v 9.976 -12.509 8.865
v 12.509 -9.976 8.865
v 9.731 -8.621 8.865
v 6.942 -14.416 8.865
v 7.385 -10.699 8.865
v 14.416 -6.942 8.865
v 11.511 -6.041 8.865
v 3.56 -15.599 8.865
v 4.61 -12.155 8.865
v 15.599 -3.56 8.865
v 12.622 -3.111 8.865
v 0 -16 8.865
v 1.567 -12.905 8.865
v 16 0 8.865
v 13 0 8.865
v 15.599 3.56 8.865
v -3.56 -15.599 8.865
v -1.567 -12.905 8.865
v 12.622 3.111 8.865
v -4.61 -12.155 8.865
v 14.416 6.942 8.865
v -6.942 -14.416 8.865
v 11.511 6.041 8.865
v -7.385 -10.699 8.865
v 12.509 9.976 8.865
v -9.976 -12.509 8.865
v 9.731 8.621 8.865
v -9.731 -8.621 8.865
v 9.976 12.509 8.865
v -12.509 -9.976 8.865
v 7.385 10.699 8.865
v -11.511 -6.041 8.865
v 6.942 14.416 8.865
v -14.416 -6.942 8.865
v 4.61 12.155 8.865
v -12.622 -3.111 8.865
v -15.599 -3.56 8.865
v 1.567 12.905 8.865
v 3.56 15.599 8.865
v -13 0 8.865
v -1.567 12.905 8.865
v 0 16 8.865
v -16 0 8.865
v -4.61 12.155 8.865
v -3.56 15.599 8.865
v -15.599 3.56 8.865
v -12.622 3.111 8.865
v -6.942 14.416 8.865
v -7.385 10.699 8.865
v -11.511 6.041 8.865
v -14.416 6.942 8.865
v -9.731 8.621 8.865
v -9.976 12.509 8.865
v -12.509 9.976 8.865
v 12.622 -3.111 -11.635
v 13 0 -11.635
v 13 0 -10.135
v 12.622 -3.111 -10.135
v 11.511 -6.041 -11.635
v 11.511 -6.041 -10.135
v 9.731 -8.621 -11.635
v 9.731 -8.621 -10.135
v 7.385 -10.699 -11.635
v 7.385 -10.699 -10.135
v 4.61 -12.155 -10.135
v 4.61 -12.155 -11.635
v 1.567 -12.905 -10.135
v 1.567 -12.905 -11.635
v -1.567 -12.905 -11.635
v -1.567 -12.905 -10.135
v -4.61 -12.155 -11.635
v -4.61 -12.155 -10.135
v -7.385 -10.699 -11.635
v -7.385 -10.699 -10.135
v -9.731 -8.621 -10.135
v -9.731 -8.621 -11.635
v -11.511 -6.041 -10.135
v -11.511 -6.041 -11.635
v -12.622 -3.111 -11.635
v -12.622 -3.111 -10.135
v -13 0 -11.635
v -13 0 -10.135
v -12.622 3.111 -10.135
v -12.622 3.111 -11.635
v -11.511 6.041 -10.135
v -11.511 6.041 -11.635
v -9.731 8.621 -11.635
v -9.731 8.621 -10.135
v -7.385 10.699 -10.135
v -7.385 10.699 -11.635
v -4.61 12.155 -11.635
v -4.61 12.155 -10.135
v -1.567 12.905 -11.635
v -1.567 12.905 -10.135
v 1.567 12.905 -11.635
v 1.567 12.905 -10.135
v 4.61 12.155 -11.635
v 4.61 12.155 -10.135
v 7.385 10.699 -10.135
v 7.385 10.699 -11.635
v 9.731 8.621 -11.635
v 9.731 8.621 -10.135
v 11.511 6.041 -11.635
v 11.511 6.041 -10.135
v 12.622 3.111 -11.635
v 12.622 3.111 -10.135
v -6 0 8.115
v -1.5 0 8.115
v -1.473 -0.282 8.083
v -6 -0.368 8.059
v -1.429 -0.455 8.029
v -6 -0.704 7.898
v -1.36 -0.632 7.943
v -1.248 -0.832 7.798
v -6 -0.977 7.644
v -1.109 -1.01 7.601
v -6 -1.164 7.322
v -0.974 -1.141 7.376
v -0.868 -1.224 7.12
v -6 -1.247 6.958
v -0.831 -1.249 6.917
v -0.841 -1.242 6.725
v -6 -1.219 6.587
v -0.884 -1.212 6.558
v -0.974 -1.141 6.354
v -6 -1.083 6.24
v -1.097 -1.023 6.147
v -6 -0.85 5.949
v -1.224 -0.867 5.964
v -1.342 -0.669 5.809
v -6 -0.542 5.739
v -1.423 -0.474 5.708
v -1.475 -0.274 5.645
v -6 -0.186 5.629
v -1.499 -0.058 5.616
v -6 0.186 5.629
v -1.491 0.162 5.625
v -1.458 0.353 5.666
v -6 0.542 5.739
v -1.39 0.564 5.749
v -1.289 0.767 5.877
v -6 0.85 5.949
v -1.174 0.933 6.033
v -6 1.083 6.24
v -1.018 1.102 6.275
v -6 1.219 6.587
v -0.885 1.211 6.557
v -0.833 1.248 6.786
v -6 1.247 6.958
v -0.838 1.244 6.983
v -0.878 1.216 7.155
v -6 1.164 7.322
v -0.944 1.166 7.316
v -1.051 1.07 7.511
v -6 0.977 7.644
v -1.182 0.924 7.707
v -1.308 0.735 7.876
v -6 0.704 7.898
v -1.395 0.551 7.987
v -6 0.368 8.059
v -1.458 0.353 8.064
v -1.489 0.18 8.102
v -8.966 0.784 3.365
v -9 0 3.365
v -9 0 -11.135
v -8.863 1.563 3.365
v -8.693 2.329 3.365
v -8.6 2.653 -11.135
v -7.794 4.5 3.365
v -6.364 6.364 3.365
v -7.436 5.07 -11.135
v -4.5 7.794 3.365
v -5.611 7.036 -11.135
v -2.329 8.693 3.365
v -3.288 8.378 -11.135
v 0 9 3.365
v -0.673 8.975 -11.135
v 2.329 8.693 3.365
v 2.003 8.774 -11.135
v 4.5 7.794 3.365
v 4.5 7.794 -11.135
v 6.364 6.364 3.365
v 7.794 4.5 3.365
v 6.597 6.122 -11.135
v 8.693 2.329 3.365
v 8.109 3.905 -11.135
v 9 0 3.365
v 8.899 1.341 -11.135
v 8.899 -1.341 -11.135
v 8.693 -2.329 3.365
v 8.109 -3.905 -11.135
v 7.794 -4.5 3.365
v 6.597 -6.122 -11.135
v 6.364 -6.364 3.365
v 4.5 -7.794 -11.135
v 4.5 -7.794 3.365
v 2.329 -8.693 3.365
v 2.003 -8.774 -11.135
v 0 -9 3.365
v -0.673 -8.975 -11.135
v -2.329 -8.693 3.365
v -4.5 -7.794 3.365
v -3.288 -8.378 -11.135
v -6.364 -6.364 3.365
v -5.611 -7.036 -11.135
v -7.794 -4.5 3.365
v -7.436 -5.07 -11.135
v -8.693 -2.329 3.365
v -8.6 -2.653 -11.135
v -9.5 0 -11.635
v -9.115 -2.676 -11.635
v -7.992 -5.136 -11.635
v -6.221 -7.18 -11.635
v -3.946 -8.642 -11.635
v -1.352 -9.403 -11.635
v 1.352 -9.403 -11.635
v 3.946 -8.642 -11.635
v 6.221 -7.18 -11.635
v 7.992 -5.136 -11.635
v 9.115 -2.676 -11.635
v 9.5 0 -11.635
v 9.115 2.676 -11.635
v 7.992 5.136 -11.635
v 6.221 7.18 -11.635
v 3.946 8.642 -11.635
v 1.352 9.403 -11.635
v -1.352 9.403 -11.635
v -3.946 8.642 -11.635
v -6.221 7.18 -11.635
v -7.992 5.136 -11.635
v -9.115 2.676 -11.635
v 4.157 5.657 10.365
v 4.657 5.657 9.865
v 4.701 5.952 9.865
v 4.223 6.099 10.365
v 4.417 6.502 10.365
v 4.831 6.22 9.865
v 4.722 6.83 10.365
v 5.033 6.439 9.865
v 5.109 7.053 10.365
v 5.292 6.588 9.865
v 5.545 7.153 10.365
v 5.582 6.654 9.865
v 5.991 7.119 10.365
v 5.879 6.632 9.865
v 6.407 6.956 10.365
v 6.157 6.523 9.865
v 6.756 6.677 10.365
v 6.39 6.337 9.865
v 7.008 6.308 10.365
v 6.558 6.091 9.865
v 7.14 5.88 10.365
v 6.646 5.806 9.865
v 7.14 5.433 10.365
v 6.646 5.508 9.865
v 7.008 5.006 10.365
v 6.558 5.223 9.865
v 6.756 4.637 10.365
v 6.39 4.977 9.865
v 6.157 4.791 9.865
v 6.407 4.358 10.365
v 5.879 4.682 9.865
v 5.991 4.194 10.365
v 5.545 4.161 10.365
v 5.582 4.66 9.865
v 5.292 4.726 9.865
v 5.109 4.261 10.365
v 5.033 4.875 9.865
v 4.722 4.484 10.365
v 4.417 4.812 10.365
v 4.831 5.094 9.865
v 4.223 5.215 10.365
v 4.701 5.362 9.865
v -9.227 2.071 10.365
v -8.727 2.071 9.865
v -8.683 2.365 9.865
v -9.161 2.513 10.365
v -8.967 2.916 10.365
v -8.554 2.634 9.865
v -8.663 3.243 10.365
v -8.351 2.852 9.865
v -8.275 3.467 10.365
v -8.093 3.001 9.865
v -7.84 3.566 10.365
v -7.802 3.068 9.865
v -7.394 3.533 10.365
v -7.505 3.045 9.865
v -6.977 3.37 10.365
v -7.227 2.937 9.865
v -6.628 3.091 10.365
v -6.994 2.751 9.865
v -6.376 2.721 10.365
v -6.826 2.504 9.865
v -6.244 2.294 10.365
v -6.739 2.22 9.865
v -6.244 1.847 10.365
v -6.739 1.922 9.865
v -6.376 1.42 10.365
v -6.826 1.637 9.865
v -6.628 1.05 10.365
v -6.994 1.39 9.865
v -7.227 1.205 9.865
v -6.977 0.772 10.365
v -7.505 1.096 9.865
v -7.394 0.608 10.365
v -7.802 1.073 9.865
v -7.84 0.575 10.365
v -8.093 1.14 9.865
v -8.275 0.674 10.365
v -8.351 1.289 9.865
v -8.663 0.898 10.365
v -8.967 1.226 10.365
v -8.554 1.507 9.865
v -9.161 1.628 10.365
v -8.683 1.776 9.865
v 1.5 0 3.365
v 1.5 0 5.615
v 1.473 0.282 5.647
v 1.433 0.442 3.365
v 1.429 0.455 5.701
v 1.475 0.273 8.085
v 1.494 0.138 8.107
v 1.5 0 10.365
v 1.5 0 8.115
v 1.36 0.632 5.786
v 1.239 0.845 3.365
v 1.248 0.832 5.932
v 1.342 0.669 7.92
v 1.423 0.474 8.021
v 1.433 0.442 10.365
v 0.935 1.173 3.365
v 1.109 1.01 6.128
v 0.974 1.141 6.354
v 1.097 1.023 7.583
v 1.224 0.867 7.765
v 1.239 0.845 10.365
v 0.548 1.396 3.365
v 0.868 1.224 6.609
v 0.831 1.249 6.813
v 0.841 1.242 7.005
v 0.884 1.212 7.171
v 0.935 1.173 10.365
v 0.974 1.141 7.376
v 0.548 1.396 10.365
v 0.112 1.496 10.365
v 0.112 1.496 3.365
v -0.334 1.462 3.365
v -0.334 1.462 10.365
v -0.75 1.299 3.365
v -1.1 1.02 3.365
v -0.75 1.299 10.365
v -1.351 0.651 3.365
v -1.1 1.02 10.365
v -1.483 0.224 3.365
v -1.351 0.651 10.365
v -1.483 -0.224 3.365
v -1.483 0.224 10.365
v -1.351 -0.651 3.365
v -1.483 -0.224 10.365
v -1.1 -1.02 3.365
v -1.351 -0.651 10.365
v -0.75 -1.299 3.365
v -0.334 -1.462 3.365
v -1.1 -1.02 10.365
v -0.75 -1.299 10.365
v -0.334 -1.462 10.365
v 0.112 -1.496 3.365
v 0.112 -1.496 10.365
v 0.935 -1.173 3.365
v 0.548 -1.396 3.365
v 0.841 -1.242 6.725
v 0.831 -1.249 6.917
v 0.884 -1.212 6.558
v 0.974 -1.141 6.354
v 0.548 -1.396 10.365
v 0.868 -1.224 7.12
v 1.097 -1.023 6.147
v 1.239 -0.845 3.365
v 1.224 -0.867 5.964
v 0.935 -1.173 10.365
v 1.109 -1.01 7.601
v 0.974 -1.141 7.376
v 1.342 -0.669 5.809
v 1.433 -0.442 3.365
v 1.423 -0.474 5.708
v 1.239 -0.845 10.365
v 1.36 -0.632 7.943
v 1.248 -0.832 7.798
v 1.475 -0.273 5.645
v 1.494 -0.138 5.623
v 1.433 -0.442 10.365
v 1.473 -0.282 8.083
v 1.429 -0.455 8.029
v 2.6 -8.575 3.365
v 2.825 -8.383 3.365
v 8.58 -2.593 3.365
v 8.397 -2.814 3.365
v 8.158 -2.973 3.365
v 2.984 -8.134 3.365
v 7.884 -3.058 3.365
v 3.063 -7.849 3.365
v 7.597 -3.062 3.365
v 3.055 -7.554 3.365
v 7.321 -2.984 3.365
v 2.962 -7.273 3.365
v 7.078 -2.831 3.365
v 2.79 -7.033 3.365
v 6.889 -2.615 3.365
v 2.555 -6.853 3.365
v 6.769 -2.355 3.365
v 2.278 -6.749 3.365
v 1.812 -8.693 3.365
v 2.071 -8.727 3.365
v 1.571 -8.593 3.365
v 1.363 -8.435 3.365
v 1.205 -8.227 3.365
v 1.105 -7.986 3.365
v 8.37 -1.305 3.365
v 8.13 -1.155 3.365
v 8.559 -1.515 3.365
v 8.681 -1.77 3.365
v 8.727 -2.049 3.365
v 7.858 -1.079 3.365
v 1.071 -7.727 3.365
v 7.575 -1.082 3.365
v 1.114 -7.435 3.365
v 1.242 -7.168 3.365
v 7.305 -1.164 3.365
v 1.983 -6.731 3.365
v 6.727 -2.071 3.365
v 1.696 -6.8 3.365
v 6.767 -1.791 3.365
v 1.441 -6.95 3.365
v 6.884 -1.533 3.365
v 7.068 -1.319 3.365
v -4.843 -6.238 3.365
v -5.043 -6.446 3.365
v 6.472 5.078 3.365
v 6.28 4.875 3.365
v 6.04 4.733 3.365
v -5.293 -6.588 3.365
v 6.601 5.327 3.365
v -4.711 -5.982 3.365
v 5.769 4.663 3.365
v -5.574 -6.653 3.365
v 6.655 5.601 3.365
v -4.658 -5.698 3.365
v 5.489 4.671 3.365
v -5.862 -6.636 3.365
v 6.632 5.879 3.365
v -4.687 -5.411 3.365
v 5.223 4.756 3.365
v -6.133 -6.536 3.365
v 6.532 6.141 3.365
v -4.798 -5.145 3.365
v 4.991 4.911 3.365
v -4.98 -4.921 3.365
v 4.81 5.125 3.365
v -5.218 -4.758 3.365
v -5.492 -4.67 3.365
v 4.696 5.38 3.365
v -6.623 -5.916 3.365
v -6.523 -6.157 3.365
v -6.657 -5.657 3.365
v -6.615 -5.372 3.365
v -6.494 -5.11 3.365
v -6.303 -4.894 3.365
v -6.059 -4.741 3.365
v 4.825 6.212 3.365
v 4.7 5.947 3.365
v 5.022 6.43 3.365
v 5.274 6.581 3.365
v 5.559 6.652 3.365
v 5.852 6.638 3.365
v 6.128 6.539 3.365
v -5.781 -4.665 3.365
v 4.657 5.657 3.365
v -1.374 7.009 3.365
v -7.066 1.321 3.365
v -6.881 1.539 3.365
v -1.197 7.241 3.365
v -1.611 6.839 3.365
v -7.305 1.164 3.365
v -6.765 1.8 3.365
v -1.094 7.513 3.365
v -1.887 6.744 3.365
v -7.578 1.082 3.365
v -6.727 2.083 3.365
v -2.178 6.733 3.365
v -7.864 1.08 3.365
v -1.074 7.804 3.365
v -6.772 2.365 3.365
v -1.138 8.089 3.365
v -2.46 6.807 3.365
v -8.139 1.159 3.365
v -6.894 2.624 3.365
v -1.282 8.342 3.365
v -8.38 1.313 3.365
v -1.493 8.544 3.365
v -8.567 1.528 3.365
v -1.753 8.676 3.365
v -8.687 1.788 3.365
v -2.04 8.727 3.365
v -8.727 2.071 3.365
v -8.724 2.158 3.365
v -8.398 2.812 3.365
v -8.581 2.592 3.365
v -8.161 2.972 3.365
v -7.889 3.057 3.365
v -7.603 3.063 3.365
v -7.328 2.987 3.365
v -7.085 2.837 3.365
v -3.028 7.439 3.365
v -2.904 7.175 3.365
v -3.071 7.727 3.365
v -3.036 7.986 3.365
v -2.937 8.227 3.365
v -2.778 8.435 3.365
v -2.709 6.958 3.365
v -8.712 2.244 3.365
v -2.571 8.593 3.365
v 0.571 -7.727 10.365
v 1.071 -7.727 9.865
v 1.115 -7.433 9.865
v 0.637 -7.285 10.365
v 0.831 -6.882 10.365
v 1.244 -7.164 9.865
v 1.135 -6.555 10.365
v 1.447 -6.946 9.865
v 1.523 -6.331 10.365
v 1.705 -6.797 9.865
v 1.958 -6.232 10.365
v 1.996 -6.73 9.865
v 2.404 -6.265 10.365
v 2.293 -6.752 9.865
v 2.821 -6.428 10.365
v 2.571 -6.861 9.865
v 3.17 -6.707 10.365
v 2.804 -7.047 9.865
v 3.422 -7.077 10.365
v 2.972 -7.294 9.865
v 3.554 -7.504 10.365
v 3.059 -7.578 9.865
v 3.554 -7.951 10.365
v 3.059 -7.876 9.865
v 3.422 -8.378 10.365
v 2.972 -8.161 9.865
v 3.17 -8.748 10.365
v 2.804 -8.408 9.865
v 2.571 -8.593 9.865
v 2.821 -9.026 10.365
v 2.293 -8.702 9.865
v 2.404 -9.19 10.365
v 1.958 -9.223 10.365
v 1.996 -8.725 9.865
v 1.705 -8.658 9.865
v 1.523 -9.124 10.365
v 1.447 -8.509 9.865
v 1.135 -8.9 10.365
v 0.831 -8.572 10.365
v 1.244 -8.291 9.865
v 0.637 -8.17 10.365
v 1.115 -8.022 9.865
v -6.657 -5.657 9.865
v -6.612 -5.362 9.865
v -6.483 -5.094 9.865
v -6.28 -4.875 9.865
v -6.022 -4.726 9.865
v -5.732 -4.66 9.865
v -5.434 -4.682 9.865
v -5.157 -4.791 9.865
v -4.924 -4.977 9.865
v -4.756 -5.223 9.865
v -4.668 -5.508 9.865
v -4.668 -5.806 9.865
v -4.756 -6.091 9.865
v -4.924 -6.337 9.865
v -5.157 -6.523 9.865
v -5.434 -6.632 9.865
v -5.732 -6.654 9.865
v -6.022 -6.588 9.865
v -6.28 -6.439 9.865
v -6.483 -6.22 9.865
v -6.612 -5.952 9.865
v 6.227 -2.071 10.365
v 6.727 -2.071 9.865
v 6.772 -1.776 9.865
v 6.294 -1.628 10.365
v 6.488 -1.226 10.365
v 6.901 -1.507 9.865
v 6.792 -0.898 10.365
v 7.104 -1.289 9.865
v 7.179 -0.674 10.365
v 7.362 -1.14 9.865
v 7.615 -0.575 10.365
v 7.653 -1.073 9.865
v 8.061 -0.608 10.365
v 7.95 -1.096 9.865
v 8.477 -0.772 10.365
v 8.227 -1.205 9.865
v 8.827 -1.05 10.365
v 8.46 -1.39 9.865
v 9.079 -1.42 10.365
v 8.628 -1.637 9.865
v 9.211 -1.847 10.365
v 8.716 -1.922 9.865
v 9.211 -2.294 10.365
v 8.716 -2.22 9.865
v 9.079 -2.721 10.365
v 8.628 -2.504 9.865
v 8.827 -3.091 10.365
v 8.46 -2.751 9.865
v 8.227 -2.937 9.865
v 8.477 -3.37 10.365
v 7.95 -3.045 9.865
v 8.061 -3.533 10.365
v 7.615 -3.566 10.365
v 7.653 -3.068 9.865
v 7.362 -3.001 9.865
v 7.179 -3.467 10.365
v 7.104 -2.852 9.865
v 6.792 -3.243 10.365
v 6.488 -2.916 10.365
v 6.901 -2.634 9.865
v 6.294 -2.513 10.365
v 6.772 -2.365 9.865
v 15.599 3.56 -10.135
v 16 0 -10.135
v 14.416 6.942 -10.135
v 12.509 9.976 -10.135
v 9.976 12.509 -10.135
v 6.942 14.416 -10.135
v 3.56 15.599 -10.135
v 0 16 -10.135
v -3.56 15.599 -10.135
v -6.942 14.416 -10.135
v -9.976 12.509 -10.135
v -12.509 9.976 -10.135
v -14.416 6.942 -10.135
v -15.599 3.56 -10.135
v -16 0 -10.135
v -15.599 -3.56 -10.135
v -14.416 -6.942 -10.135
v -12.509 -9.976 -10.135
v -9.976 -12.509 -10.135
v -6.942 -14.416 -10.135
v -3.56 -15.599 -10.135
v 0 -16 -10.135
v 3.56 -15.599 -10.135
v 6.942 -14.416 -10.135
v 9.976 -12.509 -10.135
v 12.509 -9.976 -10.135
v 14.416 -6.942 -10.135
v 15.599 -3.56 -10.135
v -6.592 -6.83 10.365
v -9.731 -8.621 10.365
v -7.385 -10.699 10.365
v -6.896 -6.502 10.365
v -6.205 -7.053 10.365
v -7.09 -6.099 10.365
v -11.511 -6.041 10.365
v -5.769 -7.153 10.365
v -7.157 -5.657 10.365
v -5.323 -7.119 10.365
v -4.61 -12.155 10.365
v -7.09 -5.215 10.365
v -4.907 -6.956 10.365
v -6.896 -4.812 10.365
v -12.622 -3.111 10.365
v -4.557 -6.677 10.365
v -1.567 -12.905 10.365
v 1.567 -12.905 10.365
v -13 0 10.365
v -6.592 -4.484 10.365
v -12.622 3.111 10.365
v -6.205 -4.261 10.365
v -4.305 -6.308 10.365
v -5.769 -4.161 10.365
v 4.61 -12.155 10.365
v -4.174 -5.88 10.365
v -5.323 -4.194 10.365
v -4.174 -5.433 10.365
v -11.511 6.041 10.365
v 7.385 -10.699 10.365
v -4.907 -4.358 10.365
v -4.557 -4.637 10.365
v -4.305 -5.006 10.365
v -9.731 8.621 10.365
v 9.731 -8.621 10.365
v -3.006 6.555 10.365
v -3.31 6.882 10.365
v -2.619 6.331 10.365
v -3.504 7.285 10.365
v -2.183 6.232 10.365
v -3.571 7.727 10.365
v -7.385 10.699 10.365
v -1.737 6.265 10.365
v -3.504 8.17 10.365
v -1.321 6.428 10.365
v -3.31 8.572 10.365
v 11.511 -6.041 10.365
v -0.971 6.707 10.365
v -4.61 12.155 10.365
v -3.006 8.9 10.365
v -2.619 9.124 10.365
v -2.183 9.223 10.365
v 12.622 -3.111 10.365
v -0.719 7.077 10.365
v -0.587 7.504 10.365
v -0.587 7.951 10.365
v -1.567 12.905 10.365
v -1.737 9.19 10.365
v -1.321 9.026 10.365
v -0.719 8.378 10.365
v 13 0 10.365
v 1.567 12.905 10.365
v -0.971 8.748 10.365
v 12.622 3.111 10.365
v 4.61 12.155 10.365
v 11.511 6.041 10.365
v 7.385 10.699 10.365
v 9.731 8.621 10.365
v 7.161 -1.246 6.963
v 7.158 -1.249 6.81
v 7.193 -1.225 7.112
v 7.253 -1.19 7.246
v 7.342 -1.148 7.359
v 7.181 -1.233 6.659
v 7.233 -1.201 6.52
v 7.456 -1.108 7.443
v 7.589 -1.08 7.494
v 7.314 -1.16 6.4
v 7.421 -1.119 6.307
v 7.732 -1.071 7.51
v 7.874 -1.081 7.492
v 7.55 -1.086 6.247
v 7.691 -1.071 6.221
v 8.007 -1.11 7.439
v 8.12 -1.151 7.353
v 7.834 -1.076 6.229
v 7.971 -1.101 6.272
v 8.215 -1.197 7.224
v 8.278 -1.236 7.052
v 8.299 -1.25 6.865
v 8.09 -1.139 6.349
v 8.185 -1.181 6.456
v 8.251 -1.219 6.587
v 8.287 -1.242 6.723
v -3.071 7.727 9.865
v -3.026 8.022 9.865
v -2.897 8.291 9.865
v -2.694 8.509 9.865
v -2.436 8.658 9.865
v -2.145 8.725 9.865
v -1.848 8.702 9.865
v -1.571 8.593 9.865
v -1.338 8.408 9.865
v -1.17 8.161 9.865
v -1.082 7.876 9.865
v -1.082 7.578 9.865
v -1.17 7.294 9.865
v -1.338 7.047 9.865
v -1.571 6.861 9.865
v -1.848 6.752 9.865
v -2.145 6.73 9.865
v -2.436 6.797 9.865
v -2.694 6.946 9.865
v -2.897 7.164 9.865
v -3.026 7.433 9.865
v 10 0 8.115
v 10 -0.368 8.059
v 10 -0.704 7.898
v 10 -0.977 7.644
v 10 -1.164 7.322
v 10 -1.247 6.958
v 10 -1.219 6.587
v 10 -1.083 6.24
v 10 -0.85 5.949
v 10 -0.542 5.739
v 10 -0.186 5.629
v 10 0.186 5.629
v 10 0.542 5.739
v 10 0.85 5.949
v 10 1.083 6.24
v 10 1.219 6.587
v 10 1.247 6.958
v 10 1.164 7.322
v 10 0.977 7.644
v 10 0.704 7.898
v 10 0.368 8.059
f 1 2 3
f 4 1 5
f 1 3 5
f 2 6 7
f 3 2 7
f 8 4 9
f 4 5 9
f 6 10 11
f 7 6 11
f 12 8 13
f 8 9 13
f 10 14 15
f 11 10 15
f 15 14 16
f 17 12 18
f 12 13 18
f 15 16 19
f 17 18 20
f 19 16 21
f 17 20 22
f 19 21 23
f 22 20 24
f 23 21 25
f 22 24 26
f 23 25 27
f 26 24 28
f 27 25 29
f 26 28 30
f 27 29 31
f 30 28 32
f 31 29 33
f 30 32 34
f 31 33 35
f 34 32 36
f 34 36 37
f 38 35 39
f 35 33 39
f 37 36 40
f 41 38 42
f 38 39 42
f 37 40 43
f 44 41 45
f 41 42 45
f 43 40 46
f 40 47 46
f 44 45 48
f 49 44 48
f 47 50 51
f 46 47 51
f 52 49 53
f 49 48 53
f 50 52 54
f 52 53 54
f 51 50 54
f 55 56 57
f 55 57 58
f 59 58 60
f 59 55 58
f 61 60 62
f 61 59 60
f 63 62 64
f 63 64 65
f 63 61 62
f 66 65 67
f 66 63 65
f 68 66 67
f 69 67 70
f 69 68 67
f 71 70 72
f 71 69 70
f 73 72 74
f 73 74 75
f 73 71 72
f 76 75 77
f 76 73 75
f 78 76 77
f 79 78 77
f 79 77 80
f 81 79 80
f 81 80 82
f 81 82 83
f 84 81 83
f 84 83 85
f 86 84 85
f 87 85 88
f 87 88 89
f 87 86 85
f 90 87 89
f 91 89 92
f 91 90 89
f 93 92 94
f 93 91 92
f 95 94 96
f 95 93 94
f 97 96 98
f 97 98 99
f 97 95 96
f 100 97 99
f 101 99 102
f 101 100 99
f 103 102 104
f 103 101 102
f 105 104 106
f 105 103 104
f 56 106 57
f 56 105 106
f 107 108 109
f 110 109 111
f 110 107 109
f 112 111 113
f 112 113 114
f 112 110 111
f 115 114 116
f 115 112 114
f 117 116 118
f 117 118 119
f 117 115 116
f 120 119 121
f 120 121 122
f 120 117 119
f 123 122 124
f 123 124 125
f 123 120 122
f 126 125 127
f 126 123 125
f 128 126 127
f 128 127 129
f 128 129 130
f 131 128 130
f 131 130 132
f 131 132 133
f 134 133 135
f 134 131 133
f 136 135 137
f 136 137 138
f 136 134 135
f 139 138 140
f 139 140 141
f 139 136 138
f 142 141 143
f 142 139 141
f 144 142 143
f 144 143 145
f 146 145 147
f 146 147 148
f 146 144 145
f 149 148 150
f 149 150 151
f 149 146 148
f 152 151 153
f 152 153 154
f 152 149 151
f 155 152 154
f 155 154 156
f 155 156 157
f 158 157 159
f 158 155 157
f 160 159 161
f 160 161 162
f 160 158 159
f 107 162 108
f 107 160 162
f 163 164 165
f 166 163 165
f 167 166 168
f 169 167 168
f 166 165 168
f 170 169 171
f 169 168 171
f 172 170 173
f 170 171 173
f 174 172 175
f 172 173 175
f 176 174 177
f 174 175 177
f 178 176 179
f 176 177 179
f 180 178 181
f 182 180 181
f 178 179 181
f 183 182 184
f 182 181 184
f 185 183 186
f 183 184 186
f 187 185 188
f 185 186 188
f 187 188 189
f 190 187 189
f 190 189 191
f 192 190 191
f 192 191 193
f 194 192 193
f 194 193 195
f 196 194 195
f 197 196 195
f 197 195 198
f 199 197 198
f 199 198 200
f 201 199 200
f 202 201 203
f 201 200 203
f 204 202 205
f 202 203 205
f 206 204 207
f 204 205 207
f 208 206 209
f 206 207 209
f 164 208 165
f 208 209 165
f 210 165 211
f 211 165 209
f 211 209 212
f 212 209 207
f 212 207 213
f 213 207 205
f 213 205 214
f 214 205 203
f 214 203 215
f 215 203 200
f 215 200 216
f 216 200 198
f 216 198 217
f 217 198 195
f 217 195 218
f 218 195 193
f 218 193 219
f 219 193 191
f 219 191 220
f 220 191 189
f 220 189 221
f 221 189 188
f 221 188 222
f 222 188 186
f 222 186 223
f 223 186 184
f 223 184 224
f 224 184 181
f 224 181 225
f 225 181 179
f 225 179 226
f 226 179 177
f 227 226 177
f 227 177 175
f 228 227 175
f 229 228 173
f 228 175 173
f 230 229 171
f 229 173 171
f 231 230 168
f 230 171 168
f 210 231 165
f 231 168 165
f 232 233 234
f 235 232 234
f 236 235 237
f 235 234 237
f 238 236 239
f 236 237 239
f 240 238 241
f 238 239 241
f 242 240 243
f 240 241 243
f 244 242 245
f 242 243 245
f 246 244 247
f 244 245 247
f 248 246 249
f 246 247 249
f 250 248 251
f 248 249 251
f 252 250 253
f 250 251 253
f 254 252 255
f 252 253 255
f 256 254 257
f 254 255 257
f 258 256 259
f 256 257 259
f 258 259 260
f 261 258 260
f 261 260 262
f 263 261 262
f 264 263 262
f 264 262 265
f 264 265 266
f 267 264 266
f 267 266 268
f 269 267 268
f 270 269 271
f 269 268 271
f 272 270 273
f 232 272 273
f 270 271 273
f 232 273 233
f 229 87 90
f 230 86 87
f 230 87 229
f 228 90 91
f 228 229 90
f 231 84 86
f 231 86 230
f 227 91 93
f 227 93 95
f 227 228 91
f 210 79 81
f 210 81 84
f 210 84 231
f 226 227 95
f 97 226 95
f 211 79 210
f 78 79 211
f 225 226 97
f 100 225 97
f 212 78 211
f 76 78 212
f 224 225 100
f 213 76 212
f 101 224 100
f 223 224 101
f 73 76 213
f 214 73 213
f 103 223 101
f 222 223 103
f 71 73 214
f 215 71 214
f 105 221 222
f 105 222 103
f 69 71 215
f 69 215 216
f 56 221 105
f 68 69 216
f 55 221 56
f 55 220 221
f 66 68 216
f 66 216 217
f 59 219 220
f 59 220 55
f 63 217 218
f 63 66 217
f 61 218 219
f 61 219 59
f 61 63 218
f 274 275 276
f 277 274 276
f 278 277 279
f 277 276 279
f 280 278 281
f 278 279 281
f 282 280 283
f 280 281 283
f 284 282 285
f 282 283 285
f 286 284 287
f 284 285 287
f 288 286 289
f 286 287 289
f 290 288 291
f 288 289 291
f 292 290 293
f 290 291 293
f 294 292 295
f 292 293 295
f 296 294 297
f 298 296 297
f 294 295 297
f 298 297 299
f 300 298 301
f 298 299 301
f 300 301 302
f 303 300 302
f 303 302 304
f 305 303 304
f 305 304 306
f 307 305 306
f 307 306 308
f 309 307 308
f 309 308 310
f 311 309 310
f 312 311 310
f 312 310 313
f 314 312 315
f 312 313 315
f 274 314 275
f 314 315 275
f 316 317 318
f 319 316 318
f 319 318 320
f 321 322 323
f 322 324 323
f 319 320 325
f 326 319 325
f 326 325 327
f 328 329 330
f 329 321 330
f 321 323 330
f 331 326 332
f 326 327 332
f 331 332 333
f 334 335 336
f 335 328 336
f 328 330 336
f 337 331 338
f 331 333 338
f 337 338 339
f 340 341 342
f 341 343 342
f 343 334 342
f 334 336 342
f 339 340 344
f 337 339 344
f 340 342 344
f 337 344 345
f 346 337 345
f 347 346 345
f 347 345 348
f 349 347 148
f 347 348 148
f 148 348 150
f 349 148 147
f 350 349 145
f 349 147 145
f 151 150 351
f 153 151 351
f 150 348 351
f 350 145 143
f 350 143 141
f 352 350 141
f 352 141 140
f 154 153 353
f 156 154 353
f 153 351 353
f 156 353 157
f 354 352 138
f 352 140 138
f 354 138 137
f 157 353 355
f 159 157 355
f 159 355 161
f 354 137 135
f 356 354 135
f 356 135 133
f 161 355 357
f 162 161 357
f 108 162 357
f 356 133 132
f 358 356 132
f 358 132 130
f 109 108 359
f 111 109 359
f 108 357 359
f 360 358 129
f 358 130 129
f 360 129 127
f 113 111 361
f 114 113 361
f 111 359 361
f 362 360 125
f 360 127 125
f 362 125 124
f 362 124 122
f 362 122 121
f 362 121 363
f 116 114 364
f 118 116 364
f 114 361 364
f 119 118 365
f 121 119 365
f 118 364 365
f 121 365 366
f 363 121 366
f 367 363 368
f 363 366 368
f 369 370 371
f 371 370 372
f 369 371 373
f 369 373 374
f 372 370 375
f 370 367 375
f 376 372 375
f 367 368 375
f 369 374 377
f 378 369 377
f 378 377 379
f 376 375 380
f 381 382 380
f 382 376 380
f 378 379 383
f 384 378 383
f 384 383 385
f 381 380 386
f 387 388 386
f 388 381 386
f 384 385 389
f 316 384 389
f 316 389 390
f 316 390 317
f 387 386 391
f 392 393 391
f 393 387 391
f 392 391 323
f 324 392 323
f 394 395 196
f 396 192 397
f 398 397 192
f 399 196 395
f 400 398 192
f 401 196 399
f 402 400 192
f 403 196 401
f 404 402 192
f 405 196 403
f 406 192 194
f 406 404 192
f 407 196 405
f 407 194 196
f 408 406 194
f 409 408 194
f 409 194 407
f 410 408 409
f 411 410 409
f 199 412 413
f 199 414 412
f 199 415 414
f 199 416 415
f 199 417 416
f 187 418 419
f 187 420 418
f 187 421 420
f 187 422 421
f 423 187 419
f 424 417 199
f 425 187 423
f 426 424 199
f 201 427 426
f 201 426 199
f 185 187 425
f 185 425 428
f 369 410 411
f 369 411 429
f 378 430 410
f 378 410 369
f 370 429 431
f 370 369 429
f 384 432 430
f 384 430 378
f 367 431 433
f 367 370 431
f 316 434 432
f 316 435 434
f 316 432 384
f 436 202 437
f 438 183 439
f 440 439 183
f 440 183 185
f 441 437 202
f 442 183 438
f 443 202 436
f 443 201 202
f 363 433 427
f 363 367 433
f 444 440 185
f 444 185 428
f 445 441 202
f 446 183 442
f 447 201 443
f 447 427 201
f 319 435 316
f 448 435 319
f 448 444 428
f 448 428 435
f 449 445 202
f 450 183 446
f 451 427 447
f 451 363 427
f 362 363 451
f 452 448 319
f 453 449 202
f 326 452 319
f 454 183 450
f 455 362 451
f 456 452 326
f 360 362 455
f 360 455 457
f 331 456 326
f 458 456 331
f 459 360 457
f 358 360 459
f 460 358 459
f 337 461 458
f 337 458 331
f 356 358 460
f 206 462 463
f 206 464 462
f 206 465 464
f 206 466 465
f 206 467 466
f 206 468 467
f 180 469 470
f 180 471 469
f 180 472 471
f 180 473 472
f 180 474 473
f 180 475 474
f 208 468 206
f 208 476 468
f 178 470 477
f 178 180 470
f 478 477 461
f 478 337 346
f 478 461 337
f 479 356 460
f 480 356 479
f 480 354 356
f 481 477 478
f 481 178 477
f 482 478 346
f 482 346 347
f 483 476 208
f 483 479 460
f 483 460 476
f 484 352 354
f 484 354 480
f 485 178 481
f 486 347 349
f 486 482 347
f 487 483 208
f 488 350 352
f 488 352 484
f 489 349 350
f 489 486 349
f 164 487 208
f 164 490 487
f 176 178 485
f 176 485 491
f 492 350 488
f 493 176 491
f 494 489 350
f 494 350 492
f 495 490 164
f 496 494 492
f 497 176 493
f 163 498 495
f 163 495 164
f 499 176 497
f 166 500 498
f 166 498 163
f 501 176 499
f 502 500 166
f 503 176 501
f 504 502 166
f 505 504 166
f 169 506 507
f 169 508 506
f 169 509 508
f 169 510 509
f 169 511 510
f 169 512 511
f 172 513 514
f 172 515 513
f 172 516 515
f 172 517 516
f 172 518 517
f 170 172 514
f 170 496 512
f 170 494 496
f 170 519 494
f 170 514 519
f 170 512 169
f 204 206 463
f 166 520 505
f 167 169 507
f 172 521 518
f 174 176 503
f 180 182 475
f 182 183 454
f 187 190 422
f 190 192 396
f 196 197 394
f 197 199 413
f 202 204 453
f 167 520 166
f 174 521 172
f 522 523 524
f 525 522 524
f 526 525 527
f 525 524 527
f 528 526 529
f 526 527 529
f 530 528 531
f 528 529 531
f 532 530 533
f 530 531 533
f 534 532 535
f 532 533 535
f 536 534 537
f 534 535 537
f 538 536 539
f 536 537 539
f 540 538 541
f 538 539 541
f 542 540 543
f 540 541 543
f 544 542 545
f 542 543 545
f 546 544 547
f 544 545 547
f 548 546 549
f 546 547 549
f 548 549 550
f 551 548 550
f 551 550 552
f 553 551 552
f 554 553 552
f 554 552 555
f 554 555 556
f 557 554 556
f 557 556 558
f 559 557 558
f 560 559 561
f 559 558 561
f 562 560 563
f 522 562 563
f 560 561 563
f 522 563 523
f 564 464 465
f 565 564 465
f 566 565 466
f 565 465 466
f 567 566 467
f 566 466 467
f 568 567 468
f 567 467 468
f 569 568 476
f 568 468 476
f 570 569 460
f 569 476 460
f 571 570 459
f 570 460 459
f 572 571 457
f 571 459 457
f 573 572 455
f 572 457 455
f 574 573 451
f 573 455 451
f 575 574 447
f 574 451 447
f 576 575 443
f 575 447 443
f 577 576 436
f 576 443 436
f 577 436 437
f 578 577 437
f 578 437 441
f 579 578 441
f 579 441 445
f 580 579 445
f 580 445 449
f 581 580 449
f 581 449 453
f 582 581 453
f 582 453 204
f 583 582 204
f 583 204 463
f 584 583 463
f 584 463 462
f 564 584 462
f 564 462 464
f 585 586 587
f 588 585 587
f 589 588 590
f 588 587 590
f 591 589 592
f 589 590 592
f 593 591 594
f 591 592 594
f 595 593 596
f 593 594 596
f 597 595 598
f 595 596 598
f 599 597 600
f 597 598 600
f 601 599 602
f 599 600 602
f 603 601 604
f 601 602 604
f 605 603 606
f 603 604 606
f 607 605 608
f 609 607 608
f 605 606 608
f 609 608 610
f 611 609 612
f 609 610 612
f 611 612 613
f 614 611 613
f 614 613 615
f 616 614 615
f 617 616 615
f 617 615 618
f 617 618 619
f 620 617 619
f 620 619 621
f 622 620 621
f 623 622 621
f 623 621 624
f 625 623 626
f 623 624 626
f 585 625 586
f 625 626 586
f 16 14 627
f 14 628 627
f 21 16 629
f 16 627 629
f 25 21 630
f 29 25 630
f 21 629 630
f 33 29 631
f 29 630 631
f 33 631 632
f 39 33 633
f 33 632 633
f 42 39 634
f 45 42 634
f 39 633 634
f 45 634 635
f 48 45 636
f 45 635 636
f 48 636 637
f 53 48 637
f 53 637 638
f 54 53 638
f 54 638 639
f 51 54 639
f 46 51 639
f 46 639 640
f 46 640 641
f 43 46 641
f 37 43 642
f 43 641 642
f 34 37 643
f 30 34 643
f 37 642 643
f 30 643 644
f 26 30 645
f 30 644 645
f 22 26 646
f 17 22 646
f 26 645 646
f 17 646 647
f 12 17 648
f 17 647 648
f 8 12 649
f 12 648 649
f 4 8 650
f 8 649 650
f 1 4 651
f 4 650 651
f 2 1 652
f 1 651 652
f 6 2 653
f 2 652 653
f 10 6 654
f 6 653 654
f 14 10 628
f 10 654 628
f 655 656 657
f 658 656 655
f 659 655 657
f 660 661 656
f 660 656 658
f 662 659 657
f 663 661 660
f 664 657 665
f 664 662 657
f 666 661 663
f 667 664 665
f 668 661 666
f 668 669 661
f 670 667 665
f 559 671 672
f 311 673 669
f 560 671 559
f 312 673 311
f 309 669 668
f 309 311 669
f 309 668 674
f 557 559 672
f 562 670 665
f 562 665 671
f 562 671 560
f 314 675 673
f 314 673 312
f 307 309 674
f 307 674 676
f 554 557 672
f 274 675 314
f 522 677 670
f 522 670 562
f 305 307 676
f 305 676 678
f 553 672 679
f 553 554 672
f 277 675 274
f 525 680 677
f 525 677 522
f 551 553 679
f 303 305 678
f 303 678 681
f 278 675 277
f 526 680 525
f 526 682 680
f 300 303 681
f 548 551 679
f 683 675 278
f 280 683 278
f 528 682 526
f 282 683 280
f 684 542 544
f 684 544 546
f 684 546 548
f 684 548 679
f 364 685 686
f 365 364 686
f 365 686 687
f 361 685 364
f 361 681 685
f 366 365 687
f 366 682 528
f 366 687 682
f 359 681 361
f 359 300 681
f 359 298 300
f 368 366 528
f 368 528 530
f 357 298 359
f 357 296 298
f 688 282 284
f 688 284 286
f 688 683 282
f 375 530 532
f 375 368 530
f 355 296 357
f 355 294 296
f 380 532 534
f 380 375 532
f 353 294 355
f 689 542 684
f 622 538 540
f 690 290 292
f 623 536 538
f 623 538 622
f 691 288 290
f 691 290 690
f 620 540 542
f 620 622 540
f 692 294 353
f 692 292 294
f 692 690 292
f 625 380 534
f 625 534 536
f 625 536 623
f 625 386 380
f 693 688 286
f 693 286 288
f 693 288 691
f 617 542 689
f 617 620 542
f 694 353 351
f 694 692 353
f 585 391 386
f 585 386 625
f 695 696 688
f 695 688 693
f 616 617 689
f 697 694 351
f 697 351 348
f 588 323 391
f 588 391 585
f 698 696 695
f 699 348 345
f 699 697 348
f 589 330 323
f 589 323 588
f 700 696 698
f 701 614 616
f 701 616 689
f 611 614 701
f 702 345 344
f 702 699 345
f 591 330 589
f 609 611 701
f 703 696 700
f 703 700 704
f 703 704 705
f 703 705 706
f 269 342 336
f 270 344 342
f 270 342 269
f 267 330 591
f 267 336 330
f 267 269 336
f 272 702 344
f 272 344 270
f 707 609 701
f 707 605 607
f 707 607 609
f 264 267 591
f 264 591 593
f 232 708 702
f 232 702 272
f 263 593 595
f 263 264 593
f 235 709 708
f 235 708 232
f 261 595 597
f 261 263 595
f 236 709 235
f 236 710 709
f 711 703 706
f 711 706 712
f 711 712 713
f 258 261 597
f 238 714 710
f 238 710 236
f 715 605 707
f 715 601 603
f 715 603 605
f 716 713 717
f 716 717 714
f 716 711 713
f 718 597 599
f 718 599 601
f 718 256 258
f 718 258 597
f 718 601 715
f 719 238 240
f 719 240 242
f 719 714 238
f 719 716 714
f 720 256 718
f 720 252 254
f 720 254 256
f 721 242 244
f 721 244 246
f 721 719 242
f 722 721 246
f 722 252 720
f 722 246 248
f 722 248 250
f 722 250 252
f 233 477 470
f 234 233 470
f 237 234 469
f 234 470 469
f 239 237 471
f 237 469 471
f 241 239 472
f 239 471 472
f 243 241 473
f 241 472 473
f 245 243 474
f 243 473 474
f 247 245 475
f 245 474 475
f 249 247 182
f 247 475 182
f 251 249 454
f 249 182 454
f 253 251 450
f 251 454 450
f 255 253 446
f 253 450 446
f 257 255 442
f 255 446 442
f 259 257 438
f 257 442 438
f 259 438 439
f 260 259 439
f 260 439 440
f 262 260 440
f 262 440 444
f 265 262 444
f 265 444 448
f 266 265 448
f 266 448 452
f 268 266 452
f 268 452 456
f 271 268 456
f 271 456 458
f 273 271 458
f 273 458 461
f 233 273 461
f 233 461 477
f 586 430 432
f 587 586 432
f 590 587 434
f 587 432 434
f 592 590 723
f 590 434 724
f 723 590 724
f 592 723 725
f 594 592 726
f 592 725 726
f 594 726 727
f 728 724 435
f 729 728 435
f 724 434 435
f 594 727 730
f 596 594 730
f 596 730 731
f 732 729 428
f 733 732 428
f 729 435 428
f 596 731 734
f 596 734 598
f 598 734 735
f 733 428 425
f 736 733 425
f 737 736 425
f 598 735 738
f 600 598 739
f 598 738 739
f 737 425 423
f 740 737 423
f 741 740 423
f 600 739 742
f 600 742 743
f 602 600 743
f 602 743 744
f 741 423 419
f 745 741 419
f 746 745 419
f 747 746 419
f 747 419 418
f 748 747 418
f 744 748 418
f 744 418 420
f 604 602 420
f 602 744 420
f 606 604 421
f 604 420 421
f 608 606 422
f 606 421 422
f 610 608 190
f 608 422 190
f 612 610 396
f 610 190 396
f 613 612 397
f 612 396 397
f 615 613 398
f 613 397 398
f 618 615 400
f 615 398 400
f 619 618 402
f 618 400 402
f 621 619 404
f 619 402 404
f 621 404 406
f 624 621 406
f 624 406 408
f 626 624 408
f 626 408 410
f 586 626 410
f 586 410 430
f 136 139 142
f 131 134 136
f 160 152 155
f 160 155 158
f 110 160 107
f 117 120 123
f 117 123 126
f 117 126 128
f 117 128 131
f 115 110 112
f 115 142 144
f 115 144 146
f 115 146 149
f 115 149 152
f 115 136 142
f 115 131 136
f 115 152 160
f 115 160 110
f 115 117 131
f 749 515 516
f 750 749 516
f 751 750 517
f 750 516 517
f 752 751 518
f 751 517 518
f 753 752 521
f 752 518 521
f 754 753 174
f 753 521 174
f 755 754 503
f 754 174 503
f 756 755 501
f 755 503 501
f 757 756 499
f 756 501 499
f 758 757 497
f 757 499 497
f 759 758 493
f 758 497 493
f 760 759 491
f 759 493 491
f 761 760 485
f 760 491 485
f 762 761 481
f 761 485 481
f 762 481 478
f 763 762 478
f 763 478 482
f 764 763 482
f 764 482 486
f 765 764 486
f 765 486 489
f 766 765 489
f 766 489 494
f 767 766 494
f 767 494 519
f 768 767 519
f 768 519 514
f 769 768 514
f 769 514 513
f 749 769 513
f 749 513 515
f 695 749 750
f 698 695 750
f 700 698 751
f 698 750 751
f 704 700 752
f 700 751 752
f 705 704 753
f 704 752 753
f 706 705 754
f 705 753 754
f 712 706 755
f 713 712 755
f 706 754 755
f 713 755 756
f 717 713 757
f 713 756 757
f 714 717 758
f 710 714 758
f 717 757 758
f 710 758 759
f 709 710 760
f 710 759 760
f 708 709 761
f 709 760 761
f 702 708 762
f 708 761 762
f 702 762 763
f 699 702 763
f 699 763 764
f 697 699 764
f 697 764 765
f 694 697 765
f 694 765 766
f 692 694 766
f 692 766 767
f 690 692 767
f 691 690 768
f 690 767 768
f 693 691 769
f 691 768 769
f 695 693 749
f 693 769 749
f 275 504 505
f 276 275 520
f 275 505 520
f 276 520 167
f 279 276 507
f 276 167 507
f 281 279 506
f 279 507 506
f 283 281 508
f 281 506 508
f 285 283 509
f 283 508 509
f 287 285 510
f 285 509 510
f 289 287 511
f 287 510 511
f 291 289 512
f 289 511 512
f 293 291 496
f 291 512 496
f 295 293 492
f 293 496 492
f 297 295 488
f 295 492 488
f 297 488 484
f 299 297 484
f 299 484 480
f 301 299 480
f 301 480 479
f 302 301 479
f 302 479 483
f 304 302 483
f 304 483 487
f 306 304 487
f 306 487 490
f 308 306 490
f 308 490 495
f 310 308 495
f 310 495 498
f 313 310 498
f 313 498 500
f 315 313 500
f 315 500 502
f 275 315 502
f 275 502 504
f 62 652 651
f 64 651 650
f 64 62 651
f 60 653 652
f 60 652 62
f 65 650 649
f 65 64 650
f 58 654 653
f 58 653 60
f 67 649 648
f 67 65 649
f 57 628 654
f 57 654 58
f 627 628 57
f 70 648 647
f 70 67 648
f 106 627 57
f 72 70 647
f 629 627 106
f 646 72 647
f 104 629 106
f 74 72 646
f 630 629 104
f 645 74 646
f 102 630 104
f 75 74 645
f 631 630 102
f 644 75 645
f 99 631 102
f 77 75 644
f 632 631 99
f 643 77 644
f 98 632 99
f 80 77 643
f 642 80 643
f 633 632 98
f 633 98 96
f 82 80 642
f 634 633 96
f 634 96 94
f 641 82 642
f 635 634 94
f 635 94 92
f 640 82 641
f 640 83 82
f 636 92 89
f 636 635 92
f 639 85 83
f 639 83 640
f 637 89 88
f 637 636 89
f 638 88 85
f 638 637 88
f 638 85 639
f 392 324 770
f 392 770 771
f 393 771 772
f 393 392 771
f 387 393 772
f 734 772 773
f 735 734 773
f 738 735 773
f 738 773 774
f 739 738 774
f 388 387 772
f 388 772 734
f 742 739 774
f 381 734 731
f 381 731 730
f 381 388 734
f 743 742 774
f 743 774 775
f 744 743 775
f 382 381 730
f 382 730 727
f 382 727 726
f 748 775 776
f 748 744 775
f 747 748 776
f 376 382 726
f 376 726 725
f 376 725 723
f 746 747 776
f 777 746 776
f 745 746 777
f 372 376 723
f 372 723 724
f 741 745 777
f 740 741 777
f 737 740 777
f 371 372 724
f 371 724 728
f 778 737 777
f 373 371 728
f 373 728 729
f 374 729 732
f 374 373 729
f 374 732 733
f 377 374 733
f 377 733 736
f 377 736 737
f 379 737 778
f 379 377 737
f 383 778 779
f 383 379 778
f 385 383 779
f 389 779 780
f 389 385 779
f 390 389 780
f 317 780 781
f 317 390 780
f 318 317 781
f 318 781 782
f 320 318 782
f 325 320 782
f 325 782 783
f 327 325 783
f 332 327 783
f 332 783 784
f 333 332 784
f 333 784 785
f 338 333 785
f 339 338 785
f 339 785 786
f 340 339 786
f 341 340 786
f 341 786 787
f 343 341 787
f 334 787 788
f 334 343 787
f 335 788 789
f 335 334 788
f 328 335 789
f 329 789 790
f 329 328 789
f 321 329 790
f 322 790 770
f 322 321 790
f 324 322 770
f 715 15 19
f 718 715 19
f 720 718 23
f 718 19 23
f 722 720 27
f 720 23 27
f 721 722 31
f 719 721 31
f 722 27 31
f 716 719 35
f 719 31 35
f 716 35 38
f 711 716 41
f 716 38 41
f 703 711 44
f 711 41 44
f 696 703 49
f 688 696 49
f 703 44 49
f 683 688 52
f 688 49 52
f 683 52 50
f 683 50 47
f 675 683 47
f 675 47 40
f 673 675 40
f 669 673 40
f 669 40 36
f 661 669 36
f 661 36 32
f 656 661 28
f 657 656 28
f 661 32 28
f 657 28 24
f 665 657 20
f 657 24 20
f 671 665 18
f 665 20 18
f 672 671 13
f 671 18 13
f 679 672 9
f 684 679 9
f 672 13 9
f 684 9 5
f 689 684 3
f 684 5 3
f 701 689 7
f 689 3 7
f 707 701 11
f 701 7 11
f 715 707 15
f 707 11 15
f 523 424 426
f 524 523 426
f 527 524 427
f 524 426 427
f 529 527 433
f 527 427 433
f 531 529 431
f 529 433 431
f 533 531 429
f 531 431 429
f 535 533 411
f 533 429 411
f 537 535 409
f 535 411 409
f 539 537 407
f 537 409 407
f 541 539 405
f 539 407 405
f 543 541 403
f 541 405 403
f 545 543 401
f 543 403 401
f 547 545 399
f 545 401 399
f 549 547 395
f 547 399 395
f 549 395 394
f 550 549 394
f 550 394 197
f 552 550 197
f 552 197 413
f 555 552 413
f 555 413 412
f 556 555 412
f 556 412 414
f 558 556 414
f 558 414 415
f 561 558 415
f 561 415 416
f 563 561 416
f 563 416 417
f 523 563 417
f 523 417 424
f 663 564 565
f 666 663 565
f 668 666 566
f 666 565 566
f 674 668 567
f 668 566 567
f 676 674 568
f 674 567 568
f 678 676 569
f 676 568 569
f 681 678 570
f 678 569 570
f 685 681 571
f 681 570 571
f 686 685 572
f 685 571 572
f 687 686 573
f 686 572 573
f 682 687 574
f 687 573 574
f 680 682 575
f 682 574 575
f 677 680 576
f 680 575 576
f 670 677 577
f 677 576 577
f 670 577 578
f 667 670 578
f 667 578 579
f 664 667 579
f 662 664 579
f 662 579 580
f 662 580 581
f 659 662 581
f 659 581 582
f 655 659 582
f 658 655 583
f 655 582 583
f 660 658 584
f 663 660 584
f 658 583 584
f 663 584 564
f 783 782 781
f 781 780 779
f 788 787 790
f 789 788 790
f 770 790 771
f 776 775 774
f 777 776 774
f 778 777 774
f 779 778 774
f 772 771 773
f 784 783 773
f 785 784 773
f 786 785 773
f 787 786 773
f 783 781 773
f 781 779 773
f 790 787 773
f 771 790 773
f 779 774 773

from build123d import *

# Parameters (mm, degrees)
CROQUIS1_W                    = 16
CROQUIS1_H                    = 19
CROQUIS2_R                    = 13
SALIENTE_EXTRUIR1_DEPTH       = 1.5
SALIENTE_EXTRUIR2_START       = 1.5
CROQUIS3_R                    = 13
SALIENTE_EXTRUIR2_DEPTH       = 1.5
TALADRO1_D                    = 3
TALADRO1_CBORE_D              = 18
TALADRO1_CBORE_DEPTH          = 15
DI_METRO_DE_TALADRO_2_0_2_1_D = 2
CORTAR_EXTRUIR1_DEPTH         = 10
CORTAR_EXTRUIR1_DEPTH_BACK    = 6
CROQUIS10_R                   = 1.25
CHAFL_N1_SIZE                 = 0.5


with BuildPart() as part:
    # Croquis1 → Revolución1 (revolve)
    with BuildSketch(Plane(origin=(0, 0, 0), x_dir=(1, 0, 0), z_dir=(0, 1, 0))):
        with Locations((8, 0.635135135)):
            Rectangle(CROQUIS1_W, CROQUIS1_H)
    revolve(axis=Axis((0, 0, -10.135135135), (0, 0, 1)))

    # Croquis2 → Saliente-Extruir1 (add)
    with BuildSketch(Plane.XY.offset(8.864864865)):
        Circle(CROQUIS2_R)
    extrude(amount=SALIENTE_EXTRUIR1_DEPTH)

    # Croquis3 → Saliente-Extruir2 (add)
    with BuildSketch(Plane(origin=(0, 0, -10.135135135), x_dir=(-1, 0, 0), z_dir=(0, 0, -1)).offset(SALIENTE_EXTRUIR2_START)):
        with Locations(Location((0, 0, 0), (0, 0, 180))):
            Circle(CROQUIS3_R)
    extrude(amount=-SALIENTE_EXTRUIR2_DEPTH)

    # Taladro1 (through all)
    with Locations(Plane(origin=(0, 0, -11.635135135), x_dir=(-1, 0, 0), z_dir=(0, 0, -1))):
        with Locations((0, 0)):
            CounterBoreHole(TALADRO1_D / 2, TALADRO1_CBORE_D / 2, TALADRO1_CBORE_DEPTH)

    # Diámetro de taladro Ø2.0 (2)1 (through all)
    with Locations(Plane.XY.offset(10.364864865)):
        with Locations((5.656854249, 5.656854249), (7.72740661, -2.070552361), (2.070552361, -7.72740661), (-5.656854249, -5.656854249), (-7.72740661, 2.070552361), (-2.070552361, 7.72740661)):
            Hole(DI_METRO_DE_TALADRO_2_0_2_1_D / 2)

    # Croquis10 → Cortar-Extruir1 (cut, two sides: drawn at the far end of the back side and taken through both)
    with BuildSketch(Plane(origin=(0, 0, 0), x_dir=(0, 0, -1), z_dir=(1, 0, 0)).offset(-CORTAR_EXTRUIR1_DEPTH_BACK)):
        with Locations(Location((-6.864864865, 0, 0), (0, 0, 180))):
            Circle(CROQUIS10_R)
    extrude(amount=CORTAR_EXTRUIR1_DEPTH + CORTAR_EXTRUIR1_DEPTH_BACK, mode=Mode.SUBTRACT)

    # Chaflán1
    chafl_n1_edges = [part.edges().sort_by_distance(p)[0] for p in [
        (9, 0, -11.635135135),
        (-1.070552361, 7.72740661, 10.364864865),
        (-6.72740661, 2.070552361, 10.364864865),
        (-4.656854249, -5.656854249, 10.364864865),
        (3.070552361, -7.72740661, 10.364864865),
        (8.72740661, -2.070552361, 10.364864865),
        (6.656854249, 5.656854249, 10.364864865),
    ]]
    chamfer(chafl_n1_edges, length=CHAFL_N1_SIZE)


solid = part.part
